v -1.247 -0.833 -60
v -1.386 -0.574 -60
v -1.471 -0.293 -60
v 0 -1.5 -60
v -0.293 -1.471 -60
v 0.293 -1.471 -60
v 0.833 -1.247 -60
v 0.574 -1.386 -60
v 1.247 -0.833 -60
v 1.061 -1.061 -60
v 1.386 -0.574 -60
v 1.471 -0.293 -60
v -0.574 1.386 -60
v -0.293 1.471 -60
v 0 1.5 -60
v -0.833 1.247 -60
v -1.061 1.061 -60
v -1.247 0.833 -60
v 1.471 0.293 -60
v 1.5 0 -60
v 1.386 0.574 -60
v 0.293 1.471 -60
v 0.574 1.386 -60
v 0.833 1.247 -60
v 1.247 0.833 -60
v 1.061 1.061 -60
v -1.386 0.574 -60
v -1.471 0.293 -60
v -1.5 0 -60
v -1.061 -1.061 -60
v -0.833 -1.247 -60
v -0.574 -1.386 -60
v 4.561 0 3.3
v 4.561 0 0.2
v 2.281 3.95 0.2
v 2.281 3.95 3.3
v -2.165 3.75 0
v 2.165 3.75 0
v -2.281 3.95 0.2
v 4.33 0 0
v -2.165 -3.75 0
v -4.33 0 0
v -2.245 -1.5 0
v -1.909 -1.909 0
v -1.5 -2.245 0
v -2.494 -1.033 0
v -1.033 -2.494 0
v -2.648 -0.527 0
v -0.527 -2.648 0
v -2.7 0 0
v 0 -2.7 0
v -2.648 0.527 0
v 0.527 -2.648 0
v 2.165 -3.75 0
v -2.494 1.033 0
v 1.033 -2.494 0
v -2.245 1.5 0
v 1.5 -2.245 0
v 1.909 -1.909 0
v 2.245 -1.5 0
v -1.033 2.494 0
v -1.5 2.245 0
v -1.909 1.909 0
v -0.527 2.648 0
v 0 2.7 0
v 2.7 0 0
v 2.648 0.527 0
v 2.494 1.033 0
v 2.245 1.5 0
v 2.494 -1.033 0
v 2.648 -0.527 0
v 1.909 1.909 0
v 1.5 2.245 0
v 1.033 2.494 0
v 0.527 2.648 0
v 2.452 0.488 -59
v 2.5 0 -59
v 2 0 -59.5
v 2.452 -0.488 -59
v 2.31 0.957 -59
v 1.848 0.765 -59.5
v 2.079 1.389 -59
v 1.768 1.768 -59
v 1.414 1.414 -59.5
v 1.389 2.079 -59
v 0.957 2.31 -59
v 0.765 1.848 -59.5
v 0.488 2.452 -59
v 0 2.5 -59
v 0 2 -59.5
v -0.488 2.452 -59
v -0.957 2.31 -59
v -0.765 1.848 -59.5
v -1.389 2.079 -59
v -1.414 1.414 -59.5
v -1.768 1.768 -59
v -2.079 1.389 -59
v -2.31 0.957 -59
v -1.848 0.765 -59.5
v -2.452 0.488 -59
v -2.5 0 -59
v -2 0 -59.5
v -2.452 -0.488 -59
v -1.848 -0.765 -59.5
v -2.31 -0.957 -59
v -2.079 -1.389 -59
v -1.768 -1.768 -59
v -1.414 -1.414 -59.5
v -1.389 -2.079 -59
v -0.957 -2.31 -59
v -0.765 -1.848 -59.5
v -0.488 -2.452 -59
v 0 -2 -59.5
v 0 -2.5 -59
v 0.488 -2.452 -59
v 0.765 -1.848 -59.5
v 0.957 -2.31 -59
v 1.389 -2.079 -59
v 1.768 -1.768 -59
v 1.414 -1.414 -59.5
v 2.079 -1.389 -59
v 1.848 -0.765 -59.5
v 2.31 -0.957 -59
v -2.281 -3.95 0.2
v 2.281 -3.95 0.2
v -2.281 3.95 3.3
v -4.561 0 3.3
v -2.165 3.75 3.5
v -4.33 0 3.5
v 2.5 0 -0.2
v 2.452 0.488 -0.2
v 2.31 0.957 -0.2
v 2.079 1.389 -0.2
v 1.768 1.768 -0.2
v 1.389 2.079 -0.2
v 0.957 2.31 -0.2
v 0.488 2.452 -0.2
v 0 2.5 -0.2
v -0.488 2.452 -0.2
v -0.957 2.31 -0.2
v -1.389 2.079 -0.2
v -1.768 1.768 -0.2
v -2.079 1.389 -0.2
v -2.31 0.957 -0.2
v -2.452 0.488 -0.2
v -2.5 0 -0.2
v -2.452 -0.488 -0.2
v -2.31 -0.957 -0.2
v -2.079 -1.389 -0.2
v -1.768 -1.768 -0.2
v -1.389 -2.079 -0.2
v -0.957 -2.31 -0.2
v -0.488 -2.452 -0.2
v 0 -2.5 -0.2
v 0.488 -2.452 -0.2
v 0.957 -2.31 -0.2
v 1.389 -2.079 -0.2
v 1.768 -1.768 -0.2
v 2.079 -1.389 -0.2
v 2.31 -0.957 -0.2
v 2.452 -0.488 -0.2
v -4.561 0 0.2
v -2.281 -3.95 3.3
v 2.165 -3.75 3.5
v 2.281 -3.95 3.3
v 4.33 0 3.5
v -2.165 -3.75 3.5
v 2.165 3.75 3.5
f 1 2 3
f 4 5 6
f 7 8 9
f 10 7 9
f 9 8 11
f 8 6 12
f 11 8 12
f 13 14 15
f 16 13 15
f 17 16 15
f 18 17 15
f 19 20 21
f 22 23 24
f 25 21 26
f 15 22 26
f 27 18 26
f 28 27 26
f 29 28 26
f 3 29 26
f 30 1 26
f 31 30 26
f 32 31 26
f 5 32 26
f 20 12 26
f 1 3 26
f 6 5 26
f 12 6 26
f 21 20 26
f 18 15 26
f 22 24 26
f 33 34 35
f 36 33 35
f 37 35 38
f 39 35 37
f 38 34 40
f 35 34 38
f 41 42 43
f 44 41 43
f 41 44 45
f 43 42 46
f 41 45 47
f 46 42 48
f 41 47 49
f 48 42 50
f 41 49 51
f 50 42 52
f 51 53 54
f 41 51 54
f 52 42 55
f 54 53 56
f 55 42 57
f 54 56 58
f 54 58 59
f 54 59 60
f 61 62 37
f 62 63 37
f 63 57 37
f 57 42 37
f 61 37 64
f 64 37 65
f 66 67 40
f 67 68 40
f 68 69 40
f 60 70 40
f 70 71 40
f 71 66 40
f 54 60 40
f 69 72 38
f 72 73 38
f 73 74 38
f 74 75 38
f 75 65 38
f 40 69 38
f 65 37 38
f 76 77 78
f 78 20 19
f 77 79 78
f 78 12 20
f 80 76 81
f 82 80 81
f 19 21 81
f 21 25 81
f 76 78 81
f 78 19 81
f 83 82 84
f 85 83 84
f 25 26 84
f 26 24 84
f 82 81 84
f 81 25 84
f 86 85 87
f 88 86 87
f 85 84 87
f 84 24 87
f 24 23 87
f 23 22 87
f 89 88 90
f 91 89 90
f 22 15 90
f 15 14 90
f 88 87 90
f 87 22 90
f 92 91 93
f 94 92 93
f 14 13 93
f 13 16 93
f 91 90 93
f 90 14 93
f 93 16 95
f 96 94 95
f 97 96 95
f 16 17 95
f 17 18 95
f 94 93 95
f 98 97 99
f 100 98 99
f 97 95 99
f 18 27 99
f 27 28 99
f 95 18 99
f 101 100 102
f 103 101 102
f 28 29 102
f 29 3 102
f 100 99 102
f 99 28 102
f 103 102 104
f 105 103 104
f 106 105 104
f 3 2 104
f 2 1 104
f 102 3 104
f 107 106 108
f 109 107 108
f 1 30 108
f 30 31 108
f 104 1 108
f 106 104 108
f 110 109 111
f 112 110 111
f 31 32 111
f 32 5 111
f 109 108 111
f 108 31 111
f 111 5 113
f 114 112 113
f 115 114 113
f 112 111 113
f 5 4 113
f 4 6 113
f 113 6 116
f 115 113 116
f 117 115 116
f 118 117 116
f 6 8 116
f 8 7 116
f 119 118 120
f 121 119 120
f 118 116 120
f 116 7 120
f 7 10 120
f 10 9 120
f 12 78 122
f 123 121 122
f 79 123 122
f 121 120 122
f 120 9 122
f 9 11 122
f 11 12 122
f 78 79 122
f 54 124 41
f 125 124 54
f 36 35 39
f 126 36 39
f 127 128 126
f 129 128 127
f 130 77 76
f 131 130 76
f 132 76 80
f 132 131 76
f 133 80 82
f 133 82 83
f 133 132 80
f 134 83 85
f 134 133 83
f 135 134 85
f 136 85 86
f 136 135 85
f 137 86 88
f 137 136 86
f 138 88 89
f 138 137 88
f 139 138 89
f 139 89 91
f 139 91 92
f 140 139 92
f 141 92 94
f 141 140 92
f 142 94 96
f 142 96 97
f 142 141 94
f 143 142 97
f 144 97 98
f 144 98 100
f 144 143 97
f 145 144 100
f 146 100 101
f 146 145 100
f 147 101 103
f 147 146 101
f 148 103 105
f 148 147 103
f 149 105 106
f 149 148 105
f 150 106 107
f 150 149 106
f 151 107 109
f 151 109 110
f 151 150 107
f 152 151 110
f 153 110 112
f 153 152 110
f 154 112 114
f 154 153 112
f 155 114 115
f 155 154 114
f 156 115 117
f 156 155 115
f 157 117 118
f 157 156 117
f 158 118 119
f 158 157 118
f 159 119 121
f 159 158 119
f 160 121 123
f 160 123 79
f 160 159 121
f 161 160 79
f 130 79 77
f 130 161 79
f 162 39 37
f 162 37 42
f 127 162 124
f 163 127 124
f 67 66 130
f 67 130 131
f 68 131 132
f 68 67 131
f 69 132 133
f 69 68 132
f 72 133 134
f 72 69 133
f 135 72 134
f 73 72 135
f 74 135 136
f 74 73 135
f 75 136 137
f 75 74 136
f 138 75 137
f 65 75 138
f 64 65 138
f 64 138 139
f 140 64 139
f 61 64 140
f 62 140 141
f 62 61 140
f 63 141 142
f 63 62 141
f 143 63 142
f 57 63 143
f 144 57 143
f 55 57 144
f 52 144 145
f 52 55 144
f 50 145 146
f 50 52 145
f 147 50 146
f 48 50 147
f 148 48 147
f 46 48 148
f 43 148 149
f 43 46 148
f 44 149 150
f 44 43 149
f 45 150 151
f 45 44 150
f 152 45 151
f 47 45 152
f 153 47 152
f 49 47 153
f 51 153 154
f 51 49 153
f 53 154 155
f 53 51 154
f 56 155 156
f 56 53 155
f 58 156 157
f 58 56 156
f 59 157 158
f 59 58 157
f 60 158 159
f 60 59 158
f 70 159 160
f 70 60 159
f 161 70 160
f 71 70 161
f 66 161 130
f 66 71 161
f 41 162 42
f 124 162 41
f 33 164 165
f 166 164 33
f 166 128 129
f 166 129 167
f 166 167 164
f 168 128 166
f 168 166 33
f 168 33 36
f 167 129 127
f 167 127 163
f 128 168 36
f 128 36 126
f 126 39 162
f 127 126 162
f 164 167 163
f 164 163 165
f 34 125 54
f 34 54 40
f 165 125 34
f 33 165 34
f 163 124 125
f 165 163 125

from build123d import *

# Parameters (mm, degrees)
F0_R     = 2.5
F1_DEPTH = 3.5
F2_DEPTH = 60
F3_SIZE  = 1
F4_SIZE  = 0.2


with BuildPart() as f1:
    # F0 (on Top) → F1 (new body)
    with BuildSketch(Plane.XY):
        Polygon((2.280534, 3.95), (-2.280534, 3.95), (-4.561067, 0), (-2.280534, -3.95), (2.280534, -3.95), (4.561067, 0), align=None)
        Circle(F0_R, mode=Mode.SUBTRACT)
        Circle(F0_R)
    extrude(amount=F1_DEPTH)

    # F0 (on Top) → F2 (join)
    with BuildSketch(Plane.XY):
        Circle(F0_R)
    extrude(amount=-F2_DEPTH)

    # F3
    f3_edges = [f1.edges().sort_by_distance(p)[0] for p in [
        (-2.5, 0, -60),
    ]]
    chamfer(f3_edges, length=F3_SIZE)

    # F4
    f4_edges = [f1.edges().sort_by_distance(p)[0] for p in [
        (0, 3.95, 3.5),
        (-3.4208, 1.975, 3.5),
        (-3.4208, -1.975, 3.5),
        (0, -3.95, 3.5),
        (3.4208, -1.975, 3.5),
        (3.4208, 1.975, 3.5),
        (0, 3.95, 0),
        (3.4208, 1.975, 0),
        (-3.4208, 1.975, 0),
        (3.4208, -1.975, 0),
        (-3.4208, -1.975, 0),
        (0, -3.95, 0),
        (-2.5, 0, 0),
    ]]
    chamfer(f4_edges, length=F4_SIZE)


solid = f1.part
